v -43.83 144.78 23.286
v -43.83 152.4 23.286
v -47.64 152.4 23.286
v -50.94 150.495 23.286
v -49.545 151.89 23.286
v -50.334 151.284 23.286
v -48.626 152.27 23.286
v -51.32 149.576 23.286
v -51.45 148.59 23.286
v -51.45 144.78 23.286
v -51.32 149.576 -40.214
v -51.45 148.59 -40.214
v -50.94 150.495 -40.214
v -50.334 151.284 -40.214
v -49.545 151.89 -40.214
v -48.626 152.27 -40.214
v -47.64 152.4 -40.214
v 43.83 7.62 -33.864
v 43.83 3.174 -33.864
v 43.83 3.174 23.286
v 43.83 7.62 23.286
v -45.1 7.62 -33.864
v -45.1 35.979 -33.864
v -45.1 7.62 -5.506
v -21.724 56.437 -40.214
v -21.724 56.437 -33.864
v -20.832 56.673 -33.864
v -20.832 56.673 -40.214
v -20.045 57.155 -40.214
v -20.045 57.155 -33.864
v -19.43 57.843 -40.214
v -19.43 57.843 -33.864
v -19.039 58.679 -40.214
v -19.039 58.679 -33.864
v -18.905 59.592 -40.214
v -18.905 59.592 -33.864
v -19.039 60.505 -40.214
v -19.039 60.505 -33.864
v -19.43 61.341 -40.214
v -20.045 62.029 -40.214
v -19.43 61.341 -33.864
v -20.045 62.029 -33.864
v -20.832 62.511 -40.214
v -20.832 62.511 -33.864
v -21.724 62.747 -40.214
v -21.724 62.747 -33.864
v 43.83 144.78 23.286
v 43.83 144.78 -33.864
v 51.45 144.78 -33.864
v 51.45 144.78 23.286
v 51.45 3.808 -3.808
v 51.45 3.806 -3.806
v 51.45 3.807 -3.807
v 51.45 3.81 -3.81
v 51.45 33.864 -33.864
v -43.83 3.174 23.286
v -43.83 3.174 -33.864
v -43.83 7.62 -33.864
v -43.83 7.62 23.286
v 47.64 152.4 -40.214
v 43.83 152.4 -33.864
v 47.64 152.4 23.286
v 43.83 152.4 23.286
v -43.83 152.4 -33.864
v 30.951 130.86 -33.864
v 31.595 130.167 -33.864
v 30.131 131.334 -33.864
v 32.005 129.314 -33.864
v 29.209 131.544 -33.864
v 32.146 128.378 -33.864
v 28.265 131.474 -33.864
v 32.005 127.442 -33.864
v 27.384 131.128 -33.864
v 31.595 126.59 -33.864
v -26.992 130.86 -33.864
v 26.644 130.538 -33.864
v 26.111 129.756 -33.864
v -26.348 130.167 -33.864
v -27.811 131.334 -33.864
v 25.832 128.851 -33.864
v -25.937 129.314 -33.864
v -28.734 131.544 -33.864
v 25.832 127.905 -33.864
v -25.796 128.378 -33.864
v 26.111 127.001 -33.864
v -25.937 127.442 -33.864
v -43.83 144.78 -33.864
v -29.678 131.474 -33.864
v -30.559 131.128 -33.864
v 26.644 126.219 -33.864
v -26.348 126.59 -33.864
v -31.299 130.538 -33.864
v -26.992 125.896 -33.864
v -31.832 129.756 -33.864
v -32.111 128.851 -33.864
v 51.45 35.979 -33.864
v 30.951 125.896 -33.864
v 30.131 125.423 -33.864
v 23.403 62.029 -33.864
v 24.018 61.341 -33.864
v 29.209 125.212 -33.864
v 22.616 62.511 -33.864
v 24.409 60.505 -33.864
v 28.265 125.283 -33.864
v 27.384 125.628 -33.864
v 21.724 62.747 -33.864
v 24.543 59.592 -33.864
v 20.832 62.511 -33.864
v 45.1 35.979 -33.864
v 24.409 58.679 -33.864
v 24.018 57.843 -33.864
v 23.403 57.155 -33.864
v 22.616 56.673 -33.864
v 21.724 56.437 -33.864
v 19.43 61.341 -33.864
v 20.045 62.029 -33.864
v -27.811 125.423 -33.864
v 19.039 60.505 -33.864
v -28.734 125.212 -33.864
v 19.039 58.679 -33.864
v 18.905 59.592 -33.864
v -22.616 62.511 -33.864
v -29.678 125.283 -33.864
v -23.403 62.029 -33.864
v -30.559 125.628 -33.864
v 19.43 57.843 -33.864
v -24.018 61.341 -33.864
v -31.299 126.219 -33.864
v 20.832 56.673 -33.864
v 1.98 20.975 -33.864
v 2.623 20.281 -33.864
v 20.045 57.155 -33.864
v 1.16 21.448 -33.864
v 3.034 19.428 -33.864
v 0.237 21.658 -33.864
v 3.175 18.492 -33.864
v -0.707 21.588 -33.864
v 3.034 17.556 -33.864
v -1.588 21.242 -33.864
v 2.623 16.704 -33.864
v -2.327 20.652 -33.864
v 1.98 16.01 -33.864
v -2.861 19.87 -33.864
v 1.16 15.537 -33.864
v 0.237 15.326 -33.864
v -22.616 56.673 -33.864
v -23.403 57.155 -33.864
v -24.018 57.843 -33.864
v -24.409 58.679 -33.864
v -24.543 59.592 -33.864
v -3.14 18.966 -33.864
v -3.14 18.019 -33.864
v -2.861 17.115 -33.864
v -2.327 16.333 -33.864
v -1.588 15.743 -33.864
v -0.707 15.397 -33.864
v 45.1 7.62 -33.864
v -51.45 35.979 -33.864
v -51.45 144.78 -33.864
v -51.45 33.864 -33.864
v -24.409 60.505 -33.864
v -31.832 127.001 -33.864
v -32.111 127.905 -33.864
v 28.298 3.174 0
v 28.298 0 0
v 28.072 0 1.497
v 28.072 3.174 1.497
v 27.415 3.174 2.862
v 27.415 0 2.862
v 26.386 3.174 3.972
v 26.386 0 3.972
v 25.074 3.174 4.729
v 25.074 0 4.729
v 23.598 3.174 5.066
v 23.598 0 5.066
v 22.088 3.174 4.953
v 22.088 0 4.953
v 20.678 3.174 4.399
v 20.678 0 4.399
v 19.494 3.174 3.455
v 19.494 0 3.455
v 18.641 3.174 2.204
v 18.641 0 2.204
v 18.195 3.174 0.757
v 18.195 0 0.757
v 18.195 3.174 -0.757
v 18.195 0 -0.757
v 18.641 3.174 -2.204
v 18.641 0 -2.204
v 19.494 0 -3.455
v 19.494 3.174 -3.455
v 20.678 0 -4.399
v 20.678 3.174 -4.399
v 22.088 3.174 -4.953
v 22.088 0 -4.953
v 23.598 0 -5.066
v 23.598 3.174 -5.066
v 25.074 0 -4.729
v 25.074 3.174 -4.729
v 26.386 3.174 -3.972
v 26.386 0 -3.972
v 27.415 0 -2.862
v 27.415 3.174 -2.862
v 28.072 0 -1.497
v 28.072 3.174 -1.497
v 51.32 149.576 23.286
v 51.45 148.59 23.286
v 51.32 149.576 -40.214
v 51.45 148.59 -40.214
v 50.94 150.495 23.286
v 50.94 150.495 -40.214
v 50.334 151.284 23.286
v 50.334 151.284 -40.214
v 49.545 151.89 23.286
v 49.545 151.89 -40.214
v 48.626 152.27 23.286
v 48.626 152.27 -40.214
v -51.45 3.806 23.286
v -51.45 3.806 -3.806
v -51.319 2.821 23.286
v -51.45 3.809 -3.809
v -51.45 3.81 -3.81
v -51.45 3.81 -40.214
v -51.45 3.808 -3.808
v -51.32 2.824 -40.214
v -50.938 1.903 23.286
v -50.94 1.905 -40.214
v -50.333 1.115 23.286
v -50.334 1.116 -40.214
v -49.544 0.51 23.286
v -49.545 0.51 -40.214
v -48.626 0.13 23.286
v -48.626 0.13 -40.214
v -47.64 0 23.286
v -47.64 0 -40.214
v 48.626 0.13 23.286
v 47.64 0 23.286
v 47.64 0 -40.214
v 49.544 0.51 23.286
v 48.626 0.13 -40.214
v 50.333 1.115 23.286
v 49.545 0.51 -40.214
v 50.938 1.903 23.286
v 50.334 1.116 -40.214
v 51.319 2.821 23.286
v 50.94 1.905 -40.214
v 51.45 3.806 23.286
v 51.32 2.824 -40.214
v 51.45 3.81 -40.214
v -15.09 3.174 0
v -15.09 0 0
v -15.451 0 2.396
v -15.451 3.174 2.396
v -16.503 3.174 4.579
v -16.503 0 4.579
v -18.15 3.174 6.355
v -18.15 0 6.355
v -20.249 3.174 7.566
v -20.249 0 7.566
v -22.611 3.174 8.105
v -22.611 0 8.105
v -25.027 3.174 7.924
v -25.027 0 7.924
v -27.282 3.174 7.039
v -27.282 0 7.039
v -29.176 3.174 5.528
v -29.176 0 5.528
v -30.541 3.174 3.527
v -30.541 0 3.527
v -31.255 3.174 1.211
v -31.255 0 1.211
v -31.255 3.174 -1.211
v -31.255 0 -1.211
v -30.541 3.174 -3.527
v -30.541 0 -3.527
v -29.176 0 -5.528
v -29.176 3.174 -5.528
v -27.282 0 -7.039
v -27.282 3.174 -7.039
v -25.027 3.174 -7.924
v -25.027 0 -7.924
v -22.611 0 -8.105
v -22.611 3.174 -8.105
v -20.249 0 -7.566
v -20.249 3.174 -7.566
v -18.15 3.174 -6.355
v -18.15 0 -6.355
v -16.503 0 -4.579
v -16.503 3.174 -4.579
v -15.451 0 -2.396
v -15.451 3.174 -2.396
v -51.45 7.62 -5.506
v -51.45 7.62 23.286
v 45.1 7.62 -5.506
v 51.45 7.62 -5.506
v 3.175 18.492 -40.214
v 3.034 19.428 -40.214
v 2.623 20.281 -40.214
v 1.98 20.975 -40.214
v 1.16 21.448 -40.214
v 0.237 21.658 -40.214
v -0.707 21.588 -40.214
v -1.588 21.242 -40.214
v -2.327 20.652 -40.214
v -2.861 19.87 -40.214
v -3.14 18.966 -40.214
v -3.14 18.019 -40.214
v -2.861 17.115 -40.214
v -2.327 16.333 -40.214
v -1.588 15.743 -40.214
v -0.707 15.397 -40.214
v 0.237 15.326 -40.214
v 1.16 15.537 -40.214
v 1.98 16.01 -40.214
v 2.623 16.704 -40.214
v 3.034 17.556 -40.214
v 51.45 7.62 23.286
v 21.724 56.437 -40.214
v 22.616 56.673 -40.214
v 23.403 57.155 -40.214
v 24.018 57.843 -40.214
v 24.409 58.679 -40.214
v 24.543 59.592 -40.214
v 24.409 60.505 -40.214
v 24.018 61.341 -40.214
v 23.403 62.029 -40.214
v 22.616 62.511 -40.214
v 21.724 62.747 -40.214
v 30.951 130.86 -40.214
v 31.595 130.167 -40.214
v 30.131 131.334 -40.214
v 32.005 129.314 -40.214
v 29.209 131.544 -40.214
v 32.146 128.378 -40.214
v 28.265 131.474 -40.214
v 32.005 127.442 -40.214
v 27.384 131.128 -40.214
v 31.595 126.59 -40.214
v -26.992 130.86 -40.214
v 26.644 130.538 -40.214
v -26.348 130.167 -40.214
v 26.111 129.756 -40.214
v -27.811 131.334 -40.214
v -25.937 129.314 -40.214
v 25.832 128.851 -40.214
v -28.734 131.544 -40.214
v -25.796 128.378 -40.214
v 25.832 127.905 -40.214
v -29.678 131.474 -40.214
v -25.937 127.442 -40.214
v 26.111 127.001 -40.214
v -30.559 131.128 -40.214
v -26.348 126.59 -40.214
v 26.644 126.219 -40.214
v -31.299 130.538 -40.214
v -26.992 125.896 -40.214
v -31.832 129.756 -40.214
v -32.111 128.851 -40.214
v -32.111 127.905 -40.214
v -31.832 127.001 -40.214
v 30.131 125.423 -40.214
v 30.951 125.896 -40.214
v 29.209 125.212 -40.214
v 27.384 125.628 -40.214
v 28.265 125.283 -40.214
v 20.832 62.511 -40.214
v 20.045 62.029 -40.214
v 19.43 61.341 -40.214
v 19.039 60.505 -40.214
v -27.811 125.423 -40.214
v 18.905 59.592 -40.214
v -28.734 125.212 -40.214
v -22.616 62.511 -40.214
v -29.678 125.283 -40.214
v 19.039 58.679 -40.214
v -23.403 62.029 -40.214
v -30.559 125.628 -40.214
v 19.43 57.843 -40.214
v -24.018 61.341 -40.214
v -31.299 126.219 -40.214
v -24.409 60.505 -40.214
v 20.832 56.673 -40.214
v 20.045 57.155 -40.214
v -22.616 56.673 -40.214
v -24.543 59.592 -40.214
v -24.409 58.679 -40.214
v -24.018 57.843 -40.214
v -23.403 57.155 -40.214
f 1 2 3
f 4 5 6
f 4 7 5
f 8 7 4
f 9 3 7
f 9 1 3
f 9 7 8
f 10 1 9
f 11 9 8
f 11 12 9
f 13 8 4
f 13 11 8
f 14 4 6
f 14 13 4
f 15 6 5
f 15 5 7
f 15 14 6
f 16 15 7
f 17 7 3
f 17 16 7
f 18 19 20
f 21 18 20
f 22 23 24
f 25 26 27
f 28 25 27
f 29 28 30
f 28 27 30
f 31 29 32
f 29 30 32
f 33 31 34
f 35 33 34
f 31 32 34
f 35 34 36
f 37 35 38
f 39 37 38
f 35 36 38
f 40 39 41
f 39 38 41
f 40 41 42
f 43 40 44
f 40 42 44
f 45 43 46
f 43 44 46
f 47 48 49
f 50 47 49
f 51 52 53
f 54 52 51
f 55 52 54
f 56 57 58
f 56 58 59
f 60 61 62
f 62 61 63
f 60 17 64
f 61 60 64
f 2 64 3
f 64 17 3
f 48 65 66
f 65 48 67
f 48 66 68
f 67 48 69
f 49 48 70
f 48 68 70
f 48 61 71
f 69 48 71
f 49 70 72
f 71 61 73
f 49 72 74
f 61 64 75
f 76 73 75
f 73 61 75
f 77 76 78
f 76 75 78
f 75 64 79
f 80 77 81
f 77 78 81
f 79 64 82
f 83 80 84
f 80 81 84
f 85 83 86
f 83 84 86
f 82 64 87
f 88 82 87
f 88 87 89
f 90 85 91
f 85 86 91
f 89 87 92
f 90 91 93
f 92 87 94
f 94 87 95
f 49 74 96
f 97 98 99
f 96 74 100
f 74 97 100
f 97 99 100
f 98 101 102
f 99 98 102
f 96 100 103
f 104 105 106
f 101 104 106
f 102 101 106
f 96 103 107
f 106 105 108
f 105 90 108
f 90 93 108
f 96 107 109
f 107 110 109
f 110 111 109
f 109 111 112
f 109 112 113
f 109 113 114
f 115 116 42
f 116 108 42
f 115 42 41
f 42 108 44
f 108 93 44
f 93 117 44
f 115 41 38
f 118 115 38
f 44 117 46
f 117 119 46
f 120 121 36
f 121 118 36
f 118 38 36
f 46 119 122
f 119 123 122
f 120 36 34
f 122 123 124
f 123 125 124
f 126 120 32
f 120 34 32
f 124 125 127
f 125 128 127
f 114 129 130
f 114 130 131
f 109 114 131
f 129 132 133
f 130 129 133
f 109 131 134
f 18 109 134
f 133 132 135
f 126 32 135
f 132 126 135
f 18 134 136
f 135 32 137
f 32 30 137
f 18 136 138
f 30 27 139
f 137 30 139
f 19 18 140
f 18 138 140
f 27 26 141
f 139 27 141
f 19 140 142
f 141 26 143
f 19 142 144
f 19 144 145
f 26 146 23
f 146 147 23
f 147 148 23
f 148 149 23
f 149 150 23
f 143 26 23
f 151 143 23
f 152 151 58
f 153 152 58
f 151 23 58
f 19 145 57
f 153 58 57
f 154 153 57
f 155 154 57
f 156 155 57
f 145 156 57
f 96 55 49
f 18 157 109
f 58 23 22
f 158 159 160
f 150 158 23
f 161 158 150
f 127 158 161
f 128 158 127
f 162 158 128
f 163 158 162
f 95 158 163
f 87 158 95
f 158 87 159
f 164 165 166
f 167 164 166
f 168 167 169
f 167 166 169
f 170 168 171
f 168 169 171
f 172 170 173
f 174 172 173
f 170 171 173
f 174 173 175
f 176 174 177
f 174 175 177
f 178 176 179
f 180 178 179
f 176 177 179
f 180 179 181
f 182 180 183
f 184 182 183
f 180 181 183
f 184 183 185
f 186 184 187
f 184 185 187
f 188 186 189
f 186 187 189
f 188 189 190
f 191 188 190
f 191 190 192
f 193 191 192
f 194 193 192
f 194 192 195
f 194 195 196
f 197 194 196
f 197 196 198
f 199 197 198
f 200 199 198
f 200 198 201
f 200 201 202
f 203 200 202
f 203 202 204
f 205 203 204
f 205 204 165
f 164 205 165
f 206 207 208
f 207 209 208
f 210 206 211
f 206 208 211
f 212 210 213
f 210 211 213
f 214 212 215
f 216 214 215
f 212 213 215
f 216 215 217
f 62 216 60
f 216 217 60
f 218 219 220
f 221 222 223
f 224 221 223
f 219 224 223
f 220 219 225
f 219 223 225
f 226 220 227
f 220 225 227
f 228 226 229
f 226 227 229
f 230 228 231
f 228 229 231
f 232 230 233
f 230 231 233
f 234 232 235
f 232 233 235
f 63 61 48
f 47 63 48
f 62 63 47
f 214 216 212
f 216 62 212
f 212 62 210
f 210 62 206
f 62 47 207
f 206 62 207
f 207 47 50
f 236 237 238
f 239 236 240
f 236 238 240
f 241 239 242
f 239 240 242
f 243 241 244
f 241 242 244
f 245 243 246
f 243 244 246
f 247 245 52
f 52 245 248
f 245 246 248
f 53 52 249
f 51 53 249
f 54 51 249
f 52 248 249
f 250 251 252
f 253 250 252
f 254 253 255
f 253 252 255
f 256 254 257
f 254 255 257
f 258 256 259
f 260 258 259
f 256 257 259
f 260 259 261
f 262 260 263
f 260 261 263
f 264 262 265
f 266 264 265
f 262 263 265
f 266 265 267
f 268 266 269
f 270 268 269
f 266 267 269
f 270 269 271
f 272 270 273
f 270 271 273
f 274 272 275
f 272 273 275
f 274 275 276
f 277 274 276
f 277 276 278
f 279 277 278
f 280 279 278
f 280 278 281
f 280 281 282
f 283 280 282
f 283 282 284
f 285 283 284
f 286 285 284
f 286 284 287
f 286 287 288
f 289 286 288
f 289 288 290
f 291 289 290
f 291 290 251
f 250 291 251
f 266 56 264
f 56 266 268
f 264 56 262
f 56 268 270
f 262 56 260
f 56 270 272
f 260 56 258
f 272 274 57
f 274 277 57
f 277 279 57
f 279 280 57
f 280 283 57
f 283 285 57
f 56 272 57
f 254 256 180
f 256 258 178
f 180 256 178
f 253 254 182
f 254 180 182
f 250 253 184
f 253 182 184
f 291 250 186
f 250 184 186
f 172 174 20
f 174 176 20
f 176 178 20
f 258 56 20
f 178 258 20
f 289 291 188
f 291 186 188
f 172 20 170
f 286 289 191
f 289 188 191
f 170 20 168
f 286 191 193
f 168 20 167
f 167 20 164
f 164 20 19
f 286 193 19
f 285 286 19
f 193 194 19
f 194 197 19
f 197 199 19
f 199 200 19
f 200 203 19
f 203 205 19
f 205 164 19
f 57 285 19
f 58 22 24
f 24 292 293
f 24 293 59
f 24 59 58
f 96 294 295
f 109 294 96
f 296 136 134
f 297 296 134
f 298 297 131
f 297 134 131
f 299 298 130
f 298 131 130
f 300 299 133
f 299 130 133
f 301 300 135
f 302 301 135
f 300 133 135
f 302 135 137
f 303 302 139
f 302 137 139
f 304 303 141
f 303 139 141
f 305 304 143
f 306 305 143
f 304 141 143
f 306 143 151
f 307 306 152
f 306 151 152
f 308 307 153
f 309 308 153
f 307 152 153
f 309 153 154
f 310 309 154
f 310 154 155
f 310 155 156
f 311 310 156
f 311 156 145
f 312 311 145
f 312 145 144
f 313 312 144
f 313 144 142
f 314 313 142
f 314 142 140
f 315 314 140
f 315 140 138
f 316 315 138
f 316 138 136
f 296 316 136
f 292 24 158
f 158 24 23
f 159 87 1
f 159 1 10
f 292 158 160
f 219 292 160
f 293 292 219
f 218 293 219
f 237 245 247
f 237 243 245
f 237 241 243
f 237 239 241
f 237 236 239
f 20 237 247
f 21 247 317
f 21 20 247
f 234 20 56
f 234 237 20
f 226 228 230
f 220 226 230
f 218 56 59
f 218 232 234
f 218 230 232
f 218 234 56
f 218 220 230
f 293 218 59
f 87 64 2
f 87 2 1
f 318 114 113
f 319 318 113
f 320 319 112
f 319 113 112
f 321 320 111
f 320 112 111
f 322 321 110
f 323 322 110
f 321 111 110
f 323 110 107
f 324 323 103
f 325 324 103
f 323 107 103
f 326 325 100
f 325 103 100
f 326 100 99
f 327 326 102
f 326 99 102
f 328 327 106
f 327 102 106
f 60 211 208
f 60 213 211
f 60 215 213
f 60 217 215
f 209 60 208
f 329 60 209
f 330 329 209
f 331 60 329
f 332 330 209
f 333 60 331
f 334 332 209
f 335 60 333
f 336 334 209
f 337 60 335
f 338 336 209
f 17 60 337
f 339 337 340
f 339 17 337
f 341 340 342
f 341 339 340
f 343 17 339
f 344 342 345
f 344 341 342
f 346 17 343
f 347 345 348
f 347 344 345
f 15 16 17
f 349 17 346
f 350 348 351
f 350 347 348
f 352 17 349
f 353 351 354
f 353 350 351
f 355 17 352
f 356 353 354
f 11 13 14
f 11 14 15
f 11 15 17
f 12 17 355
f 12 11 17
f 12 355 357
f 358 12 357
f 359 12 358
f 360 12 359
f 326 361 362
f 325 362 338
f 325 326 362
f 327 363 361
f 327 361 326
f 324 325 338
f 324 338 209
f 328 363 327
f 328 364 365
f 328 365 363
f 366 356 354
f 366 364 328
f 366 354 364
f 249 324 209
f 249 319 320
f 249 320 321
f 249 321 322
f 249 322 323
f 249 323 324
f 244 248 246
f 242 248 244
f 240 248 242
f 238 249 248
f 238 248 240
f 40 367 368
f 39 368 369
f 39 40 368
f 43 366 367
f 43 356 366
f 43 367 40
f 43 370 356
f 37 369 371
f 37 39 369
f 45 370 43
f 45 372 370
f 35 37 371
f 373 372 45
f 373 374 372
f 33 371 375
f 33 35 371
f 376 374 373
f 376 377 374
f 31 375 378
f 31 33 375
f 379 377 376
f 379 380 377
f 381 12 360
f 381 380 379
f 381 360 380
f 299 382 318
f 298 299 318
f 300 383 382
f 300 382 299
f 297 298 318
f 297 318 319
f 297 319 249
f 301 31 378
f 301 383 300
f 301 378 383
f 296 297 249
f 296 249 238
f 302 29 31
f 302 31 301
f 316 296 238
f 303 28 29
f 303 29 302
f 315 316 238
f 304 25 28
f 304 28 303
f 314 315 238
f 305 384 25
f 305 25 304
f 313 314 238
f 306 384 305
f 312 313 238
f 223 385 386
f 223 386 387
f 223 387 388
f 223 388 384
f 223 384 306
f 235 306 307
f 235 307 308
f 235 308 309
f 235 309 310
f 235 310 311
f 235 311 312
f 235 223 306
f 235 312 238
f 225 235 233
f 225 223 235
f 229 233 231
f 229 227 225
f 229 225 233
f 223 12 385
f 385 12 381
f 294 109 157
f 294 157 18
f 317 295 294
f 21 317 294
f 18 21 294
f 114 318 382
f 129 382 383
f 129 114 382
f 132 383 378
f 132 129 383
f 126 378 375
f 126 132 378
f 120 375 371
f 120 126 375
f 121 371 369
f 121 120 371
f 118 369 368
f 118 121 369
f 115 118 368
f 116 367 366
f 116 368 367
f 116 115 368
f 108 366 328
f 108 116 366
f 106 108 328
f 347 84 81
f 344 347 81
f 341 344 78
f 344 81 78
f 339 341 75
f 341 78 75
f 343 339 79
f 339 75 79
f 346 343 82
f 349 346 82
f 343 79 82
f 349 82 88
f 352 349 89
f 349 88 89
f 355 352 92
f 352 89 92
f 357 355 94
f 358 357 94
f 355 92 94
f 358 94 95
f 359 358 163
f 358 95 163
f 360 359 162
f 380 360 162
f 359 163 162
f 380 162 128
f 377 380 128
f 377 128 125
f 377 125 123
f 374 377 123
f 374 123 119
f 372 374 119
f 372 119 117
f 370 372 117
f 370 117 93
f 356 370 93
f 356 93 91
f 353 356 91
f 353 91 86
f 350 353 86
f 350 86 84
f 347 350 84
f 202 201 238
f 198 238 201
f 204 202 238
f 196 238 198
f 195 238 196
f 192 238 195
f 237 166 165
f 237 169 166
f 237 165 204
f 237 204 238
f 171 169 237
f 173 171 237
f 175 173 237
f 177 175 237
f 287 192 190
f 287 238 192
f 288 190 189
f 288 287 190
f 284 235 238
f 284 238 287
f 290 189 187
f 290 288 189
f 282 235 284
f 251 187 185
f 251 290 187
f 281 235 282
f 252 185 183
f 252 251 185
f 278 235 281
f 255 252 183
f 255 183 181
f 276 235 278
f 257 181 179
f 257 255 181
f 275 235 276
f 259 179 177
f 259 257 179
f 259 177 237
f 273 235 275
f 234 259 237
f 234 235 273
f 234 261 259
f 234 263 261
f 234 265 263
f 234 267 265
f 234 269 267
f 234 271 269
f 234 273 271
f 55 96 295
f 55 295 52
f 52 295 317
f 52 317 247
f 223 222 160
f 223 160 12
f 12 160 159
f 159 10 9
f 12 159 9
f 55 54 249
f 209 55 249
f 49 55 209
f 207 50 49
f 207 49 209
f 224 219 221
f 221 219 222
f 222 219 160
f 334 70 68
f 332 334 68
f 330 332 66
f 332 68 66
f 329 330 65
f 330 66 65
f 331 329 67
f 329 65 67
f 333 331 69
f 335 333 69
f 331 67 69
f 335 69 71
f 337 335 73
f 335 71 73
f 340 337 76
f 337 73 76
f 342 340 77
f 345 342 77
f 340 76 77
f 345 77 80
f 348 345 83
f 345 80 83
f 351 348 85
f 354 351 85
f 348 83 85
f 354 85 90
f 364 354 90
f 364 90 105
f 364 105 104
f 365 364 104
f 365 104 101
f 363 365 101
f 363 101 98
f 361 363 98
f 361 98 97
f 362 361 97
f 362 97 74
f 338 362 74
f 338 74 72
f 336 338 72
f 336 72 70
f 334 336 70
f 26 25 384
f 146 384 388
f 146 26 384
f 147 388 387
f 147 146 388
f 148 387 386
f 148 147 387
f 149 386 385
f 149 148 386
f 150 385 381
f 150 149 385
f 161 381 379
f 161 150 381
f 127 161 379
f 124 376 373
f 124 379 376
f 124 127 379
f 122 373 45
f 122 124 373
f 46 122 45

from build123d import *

# Parameters (mm, degrees)
F0_W         = 88.9
F0_H         = 63.5
F1_DEPTH     = 3.174
F2_W         = 88.9
F2_H         = 149.226
F3_DEPTH     = 6.35
F4_W         = 34.926
F4_H         = 33.8644637015
F5_DEPTH     = 6.35
F6_W         = 37.0404637015
F6_H         = 33.8644637015
F7_DEPTH     = 6.35
F8_T4_DEPTH  = 6.35
F9_T4_DEPTH  = 6.35
F10_R        = 8
F11_DEPTH    = 152.401
F10_R_2      = 5
F12_DEPTH    = 25.4
F13_R        = 3.175
F14_DEPTH    = 25.4
F15_DEPTH    = 7
F16_DEPTH    = 7
F17_DEPTH    = 7
F18_DEPTH    = 7
F19_W        = 7.62
F19_H        = 7.62
F20_DEPTH    = 63.5
F21_W        = 7.62
F21_H        = 63.5
F22_DEPTH    = 7.62
F24_T1_DEPTH = 82.55
F25_T1_DEPTH = 82.55
F26_R        = 3.81
F28_R        = 3.175
F29_DEPTH    = 25.4
F30_R        = 8.128
F31_DEPTH    = 25.4
F32_R        = 5.08
F33_DEPTH    = 25.4


# Not quite as in the source:
# - a fillet or chamfer that OpenCascade refuses, or shapes differently, is made with other operations: its cross-section is extruded or revolved along the edge and cut away or added
# - two fillets or chamfers of one size are made in one step


with BuildPart() as f1:
    # F0 (on Front) → F1 (new body)
    with BuildSketch(Plane.XZ):
        with Locations((8.606e-07, -8.4644637015)):
            Rectangle(F0_W, F0_H)
    extrude(amount=-F1_DEPTH)

    # F2 (on face) → F3 (join)
    with BuildSketch(Plane(origin=(0, 0, -40.2144637015), x_dir=(1, 0, 0), z_dir=(0, 0, -1))):
        with Locations((8.606e-07, -77.787)):
            Rectangle(F2_W, F2_H)
    extrude(amount=-F3_DEPTH)

    # F4 (on face) → F5 (join)
    with BuildSketch(Plane.YZ.offset(44.4500008606)):
        with Locations((20.637, -16.9322318508)):
            Rectangle(F4_W, F4_H)
    extrude(amount=-F5_DEPTH)

    # F6 (on face) → F7 (join)
    with BuildSketch(Plane(origin=(-44.4499991394, 0, 0), x_dir=(0, -1, 0), z_dir=(-1, 0, 0))):
        with Locations((-21.6942318508, -16.9322318508)):
            Rectangle(F6_W, F6_H)
    extrude(amount=-F7_DEPTH)

    # F8: chamfer of 38.1 on 1 edges, made by hand


with BuildPart() as f8_tool2:
    # F8_s3 → F8_t4 (new body)
    with BuildSketch(Plane.YZ.offset(-44.4499991394)):
        with BuildLine():
            Line((1.036832967, 1.0776307345), (41.292094436, -39.1776307345))
            Line((41.292094436, -39.1776307345), (42.054094436, -39.1776307345))
            ThreePointArc((42.054094436, -39.1776307345), (40.9764637015, -19.5888153673), (40.9764637015, 0))
            Line((40.9764637015, 0), (40.2144637015, 0.762))
            ThreePointArc((40.2144637015, 0.762), (20.6256483342, 0.762), (1.036832967, 1.8396307345))
            Line((1.036832967, 1.8396307345), (1.036832967, 1.0776307345))
        make_face()
    extrude(amount=F8_T4_DEPTH)

    split(bisect_by=Plane.XZ.offset(-3.174), keep=Keep.BOTTOM)

    split(bisect_by=Plane.XY.offset(-33.8644637015), keep=Keep.TOP)


with BuildPart() as f1_1:
    add(f1.part)

    # F8_t1: cut F8_tool2
    add(f8_tool2.part, mode=Mode.SUBTRACT)

    # F9: chamfer of 38.1 on 1 edges, made by hand


with BuildPart() as f9_tool2:
    # F9_s3 → F9_t4 (new body)
    with BuildSketch(Plane.YZ.offset(44.4500008606)):
        with BuildLine():
            Line((-1.0776307345, 1.0776307345), (39.1776307345, -39.1776307345))
            Line((39.1776307345, -39.1776307345), (39.9396307345, -39.1776307345))
            ThreePointArc((39.9396307345, -39.1776307345), (38.862, -19.5888153673), (38.862, 0))
            Line((38.862, 0), (38.1, 0.762))
            ThreePointArc((38.1, 0.762), (18.5111846327, 0.762), (-1.0776307345, 1.8396307345))
            Line((-1.0776307345, 1.8396307345), (-1.0776307345, 1.0776307345))
        make_face()
    extrude(amount=-F9_T4_DEPTH)

    split(bisect_by=Plane.XZ.offset(-3.174), keep=Keep.BOTTOM)

    split(bisect_by=Plane.XY.offset(-33.8644637015), keep=Keep.TOP)


with BuildPart() as f1_2:
    add(f1_1.part)

    # F9_t1: cut F9_tool2
    add(f9_tool2.part, mode=Mode.SUBTRACT)

    # F10 (on face) → F11 (cut, through all)
    with BuildSketch(Plane.XZ):
        with Locations((-23.4761538258, 0)):
            Circle(F10_R)
    extrude(amount=-F11_DEPTH, mode=Mode.SUBTRACT)

    # F10 (on face) → F12 (cut)
    with BuildSketch(Plane.XZ):
        with Locations((-23.4761538258, 0)):
            Circle(F10_R)
        with Locations((23.2181741801, 0)):
            Circle(F10_R_2)
    extrude(amount=-F12_DEPTH, mode=Mode.SUBTRACT)

    # F13 (on face) → F14 (cut)
    with BuildSketch(Plane.XY.offset(-33.8644637015)):
        with Locations((0, 18.4923222025)):
            Circle(F13_R)
        with Locations((-22.079911083, 59.5920197666)):
            Circle(F13_R)
        with Locations((21.367656067, 59.5920197666)):
            Circle(F13_R)
    extrude(amount=-F14_DEPTH, mode=Mode.SUBTRACT)

    # F15 (add): a face of the model
    f15_faces = [f1_2.faces().sort_by_distance(p)[0] for p in [
        (44.4500008606, 76.2, -38.5634637015),
    ]]
    extrude(f15_faces, amount=F15_DEPTH)

    # F16 (add): a face of the model
    f16_faces = [f1_2.faces().sort_by_distance(p)[0] for p in [
        (-44.4499991394, 1.651, -8.4644637015),
    ]]
    extrude(f16_faces, amount=F16_DEPTH)

    # F17 (cut): a face of the model
    f17_faces = [f1_2.faces().sort_by_distance(p)[0] for p in [
        (38.1000008606, 13.4041545672, -23.6343091343),
    ]]
    extrude(f17_faces, amount=-F17_DEPTH, mode=Mode.SUBTRACT)

    # F18 (cut): a face of the model
    f18_faces = [f1_2.faces().sort_by_distance(p)[0] for p in [
        (-38.0999991394, 14.108975801, -22.9294879005),
    ]]
    extrude(f18_faces, amount=-F18_DEPTH, mode=Mode.SUBTRACT)

    # F19 (on face) → F20 (join)
    with BuildSketch(Plane(origin=(0, 0, -40.2144637015), x_dir=(1, 0, 0), z_dir=(0, 0, -1))):
        with Locations((47.6400008606, -148.59)):
            Rectangle(F19_W, F19_H)
    extrude(amount=-F20_DEPTH)

    # F21 (on face) → F22 (join)
    with BuildSketch(Plane.XZ):
        with Locations((-47.6399991394, -8.4644637015)):
            Rectangle(F21_W, F21_H)
    extrude(amount=-F22_DEPTH)

    # F23: F1 across plane


with BuildPart() as f1_3:
    add(f1_2.part)
    add(f1_2.part.mirror(Plane.YZ))

    # F24: fillet of radius 3.81 on 1 edges, made by hand

    # F24_s2 → F24_t1 (cut)
    with BuildSketch(Plane.XY.offset(-49.7394637015)):
        with BuildLine():
            ThreePointArc((47.6400008606, 0), (50.3340776969, 1.1159231637), (51.4500008606, 3.81))
            Line((51.4500008606, 3.81), (51.4500008606, 0))
            Line((51.4500008606, 0), (47.6400008606, 0))
        make_face()
    extrude(amount=F24_T1_DEPTH, mode=Mode.SUBTRACT)

    # F25: fillet of radius 3.81 on 1 edges, made by hand

    # F25_s2 → F25_t1 (cut)
    with BuildSketch(Plane.XY.offset(-49.7394637015)):
        with BuildLine():
            ThreePointArc((-51.4500008606, 3.81), (-50.3340776969, 1.1159231637), (-47.6400008606, 0))
            Line((-47.6400008606, 0), (-51.4500008606, 0))
            Line((-51.4500008606, 0), (-51.4500008606, 3.81))
        make_face()
    extrude(amount=F25_T1_DEPTH, mode=Mode.SUBTRACT)

    # F26
    f26_edges = [f1_3.edges().sort_by_distance(p)[0] for p in [
        (51.450001, 152.4, -8.464464),
        (-51.450001, 152.4, -8.464464),
    ]]
    fillet(f26_edges, radius=F26_R)

    # F28 (on face) → F29 (cut)
    with BuildSketch(Plane.XY.offset(-33.8644637015)):
        with Locations((28.9712660015, 128.3781081438)):
            Circle(F28_R)
        with Locations((-28.9712660015, 128.3781081438)):
            Circle(F28_R)
    extrude(amount=-F29_DEPTH, mode=Mode.SUBTRACT)

    # F30 (on face) → F31 (cut)
    with BuildSketch(Plane.XZ):
        with Locations((-23.2181741801, 0)):
            Circle(F30_R)
    extrude(amount=-F31_DEPTH, mode=Mode.SUBTRACT)

    # F32 (on face) → F33 (cut)
    with BuildSketch(Plane.XZ):
        with Locations((23.2181741801, 0)):
            Circle(F32_R)
    extrude(amount=-F33_DEPTH, mode=Mode.SUBTRACT)


solid = f1_3.part
